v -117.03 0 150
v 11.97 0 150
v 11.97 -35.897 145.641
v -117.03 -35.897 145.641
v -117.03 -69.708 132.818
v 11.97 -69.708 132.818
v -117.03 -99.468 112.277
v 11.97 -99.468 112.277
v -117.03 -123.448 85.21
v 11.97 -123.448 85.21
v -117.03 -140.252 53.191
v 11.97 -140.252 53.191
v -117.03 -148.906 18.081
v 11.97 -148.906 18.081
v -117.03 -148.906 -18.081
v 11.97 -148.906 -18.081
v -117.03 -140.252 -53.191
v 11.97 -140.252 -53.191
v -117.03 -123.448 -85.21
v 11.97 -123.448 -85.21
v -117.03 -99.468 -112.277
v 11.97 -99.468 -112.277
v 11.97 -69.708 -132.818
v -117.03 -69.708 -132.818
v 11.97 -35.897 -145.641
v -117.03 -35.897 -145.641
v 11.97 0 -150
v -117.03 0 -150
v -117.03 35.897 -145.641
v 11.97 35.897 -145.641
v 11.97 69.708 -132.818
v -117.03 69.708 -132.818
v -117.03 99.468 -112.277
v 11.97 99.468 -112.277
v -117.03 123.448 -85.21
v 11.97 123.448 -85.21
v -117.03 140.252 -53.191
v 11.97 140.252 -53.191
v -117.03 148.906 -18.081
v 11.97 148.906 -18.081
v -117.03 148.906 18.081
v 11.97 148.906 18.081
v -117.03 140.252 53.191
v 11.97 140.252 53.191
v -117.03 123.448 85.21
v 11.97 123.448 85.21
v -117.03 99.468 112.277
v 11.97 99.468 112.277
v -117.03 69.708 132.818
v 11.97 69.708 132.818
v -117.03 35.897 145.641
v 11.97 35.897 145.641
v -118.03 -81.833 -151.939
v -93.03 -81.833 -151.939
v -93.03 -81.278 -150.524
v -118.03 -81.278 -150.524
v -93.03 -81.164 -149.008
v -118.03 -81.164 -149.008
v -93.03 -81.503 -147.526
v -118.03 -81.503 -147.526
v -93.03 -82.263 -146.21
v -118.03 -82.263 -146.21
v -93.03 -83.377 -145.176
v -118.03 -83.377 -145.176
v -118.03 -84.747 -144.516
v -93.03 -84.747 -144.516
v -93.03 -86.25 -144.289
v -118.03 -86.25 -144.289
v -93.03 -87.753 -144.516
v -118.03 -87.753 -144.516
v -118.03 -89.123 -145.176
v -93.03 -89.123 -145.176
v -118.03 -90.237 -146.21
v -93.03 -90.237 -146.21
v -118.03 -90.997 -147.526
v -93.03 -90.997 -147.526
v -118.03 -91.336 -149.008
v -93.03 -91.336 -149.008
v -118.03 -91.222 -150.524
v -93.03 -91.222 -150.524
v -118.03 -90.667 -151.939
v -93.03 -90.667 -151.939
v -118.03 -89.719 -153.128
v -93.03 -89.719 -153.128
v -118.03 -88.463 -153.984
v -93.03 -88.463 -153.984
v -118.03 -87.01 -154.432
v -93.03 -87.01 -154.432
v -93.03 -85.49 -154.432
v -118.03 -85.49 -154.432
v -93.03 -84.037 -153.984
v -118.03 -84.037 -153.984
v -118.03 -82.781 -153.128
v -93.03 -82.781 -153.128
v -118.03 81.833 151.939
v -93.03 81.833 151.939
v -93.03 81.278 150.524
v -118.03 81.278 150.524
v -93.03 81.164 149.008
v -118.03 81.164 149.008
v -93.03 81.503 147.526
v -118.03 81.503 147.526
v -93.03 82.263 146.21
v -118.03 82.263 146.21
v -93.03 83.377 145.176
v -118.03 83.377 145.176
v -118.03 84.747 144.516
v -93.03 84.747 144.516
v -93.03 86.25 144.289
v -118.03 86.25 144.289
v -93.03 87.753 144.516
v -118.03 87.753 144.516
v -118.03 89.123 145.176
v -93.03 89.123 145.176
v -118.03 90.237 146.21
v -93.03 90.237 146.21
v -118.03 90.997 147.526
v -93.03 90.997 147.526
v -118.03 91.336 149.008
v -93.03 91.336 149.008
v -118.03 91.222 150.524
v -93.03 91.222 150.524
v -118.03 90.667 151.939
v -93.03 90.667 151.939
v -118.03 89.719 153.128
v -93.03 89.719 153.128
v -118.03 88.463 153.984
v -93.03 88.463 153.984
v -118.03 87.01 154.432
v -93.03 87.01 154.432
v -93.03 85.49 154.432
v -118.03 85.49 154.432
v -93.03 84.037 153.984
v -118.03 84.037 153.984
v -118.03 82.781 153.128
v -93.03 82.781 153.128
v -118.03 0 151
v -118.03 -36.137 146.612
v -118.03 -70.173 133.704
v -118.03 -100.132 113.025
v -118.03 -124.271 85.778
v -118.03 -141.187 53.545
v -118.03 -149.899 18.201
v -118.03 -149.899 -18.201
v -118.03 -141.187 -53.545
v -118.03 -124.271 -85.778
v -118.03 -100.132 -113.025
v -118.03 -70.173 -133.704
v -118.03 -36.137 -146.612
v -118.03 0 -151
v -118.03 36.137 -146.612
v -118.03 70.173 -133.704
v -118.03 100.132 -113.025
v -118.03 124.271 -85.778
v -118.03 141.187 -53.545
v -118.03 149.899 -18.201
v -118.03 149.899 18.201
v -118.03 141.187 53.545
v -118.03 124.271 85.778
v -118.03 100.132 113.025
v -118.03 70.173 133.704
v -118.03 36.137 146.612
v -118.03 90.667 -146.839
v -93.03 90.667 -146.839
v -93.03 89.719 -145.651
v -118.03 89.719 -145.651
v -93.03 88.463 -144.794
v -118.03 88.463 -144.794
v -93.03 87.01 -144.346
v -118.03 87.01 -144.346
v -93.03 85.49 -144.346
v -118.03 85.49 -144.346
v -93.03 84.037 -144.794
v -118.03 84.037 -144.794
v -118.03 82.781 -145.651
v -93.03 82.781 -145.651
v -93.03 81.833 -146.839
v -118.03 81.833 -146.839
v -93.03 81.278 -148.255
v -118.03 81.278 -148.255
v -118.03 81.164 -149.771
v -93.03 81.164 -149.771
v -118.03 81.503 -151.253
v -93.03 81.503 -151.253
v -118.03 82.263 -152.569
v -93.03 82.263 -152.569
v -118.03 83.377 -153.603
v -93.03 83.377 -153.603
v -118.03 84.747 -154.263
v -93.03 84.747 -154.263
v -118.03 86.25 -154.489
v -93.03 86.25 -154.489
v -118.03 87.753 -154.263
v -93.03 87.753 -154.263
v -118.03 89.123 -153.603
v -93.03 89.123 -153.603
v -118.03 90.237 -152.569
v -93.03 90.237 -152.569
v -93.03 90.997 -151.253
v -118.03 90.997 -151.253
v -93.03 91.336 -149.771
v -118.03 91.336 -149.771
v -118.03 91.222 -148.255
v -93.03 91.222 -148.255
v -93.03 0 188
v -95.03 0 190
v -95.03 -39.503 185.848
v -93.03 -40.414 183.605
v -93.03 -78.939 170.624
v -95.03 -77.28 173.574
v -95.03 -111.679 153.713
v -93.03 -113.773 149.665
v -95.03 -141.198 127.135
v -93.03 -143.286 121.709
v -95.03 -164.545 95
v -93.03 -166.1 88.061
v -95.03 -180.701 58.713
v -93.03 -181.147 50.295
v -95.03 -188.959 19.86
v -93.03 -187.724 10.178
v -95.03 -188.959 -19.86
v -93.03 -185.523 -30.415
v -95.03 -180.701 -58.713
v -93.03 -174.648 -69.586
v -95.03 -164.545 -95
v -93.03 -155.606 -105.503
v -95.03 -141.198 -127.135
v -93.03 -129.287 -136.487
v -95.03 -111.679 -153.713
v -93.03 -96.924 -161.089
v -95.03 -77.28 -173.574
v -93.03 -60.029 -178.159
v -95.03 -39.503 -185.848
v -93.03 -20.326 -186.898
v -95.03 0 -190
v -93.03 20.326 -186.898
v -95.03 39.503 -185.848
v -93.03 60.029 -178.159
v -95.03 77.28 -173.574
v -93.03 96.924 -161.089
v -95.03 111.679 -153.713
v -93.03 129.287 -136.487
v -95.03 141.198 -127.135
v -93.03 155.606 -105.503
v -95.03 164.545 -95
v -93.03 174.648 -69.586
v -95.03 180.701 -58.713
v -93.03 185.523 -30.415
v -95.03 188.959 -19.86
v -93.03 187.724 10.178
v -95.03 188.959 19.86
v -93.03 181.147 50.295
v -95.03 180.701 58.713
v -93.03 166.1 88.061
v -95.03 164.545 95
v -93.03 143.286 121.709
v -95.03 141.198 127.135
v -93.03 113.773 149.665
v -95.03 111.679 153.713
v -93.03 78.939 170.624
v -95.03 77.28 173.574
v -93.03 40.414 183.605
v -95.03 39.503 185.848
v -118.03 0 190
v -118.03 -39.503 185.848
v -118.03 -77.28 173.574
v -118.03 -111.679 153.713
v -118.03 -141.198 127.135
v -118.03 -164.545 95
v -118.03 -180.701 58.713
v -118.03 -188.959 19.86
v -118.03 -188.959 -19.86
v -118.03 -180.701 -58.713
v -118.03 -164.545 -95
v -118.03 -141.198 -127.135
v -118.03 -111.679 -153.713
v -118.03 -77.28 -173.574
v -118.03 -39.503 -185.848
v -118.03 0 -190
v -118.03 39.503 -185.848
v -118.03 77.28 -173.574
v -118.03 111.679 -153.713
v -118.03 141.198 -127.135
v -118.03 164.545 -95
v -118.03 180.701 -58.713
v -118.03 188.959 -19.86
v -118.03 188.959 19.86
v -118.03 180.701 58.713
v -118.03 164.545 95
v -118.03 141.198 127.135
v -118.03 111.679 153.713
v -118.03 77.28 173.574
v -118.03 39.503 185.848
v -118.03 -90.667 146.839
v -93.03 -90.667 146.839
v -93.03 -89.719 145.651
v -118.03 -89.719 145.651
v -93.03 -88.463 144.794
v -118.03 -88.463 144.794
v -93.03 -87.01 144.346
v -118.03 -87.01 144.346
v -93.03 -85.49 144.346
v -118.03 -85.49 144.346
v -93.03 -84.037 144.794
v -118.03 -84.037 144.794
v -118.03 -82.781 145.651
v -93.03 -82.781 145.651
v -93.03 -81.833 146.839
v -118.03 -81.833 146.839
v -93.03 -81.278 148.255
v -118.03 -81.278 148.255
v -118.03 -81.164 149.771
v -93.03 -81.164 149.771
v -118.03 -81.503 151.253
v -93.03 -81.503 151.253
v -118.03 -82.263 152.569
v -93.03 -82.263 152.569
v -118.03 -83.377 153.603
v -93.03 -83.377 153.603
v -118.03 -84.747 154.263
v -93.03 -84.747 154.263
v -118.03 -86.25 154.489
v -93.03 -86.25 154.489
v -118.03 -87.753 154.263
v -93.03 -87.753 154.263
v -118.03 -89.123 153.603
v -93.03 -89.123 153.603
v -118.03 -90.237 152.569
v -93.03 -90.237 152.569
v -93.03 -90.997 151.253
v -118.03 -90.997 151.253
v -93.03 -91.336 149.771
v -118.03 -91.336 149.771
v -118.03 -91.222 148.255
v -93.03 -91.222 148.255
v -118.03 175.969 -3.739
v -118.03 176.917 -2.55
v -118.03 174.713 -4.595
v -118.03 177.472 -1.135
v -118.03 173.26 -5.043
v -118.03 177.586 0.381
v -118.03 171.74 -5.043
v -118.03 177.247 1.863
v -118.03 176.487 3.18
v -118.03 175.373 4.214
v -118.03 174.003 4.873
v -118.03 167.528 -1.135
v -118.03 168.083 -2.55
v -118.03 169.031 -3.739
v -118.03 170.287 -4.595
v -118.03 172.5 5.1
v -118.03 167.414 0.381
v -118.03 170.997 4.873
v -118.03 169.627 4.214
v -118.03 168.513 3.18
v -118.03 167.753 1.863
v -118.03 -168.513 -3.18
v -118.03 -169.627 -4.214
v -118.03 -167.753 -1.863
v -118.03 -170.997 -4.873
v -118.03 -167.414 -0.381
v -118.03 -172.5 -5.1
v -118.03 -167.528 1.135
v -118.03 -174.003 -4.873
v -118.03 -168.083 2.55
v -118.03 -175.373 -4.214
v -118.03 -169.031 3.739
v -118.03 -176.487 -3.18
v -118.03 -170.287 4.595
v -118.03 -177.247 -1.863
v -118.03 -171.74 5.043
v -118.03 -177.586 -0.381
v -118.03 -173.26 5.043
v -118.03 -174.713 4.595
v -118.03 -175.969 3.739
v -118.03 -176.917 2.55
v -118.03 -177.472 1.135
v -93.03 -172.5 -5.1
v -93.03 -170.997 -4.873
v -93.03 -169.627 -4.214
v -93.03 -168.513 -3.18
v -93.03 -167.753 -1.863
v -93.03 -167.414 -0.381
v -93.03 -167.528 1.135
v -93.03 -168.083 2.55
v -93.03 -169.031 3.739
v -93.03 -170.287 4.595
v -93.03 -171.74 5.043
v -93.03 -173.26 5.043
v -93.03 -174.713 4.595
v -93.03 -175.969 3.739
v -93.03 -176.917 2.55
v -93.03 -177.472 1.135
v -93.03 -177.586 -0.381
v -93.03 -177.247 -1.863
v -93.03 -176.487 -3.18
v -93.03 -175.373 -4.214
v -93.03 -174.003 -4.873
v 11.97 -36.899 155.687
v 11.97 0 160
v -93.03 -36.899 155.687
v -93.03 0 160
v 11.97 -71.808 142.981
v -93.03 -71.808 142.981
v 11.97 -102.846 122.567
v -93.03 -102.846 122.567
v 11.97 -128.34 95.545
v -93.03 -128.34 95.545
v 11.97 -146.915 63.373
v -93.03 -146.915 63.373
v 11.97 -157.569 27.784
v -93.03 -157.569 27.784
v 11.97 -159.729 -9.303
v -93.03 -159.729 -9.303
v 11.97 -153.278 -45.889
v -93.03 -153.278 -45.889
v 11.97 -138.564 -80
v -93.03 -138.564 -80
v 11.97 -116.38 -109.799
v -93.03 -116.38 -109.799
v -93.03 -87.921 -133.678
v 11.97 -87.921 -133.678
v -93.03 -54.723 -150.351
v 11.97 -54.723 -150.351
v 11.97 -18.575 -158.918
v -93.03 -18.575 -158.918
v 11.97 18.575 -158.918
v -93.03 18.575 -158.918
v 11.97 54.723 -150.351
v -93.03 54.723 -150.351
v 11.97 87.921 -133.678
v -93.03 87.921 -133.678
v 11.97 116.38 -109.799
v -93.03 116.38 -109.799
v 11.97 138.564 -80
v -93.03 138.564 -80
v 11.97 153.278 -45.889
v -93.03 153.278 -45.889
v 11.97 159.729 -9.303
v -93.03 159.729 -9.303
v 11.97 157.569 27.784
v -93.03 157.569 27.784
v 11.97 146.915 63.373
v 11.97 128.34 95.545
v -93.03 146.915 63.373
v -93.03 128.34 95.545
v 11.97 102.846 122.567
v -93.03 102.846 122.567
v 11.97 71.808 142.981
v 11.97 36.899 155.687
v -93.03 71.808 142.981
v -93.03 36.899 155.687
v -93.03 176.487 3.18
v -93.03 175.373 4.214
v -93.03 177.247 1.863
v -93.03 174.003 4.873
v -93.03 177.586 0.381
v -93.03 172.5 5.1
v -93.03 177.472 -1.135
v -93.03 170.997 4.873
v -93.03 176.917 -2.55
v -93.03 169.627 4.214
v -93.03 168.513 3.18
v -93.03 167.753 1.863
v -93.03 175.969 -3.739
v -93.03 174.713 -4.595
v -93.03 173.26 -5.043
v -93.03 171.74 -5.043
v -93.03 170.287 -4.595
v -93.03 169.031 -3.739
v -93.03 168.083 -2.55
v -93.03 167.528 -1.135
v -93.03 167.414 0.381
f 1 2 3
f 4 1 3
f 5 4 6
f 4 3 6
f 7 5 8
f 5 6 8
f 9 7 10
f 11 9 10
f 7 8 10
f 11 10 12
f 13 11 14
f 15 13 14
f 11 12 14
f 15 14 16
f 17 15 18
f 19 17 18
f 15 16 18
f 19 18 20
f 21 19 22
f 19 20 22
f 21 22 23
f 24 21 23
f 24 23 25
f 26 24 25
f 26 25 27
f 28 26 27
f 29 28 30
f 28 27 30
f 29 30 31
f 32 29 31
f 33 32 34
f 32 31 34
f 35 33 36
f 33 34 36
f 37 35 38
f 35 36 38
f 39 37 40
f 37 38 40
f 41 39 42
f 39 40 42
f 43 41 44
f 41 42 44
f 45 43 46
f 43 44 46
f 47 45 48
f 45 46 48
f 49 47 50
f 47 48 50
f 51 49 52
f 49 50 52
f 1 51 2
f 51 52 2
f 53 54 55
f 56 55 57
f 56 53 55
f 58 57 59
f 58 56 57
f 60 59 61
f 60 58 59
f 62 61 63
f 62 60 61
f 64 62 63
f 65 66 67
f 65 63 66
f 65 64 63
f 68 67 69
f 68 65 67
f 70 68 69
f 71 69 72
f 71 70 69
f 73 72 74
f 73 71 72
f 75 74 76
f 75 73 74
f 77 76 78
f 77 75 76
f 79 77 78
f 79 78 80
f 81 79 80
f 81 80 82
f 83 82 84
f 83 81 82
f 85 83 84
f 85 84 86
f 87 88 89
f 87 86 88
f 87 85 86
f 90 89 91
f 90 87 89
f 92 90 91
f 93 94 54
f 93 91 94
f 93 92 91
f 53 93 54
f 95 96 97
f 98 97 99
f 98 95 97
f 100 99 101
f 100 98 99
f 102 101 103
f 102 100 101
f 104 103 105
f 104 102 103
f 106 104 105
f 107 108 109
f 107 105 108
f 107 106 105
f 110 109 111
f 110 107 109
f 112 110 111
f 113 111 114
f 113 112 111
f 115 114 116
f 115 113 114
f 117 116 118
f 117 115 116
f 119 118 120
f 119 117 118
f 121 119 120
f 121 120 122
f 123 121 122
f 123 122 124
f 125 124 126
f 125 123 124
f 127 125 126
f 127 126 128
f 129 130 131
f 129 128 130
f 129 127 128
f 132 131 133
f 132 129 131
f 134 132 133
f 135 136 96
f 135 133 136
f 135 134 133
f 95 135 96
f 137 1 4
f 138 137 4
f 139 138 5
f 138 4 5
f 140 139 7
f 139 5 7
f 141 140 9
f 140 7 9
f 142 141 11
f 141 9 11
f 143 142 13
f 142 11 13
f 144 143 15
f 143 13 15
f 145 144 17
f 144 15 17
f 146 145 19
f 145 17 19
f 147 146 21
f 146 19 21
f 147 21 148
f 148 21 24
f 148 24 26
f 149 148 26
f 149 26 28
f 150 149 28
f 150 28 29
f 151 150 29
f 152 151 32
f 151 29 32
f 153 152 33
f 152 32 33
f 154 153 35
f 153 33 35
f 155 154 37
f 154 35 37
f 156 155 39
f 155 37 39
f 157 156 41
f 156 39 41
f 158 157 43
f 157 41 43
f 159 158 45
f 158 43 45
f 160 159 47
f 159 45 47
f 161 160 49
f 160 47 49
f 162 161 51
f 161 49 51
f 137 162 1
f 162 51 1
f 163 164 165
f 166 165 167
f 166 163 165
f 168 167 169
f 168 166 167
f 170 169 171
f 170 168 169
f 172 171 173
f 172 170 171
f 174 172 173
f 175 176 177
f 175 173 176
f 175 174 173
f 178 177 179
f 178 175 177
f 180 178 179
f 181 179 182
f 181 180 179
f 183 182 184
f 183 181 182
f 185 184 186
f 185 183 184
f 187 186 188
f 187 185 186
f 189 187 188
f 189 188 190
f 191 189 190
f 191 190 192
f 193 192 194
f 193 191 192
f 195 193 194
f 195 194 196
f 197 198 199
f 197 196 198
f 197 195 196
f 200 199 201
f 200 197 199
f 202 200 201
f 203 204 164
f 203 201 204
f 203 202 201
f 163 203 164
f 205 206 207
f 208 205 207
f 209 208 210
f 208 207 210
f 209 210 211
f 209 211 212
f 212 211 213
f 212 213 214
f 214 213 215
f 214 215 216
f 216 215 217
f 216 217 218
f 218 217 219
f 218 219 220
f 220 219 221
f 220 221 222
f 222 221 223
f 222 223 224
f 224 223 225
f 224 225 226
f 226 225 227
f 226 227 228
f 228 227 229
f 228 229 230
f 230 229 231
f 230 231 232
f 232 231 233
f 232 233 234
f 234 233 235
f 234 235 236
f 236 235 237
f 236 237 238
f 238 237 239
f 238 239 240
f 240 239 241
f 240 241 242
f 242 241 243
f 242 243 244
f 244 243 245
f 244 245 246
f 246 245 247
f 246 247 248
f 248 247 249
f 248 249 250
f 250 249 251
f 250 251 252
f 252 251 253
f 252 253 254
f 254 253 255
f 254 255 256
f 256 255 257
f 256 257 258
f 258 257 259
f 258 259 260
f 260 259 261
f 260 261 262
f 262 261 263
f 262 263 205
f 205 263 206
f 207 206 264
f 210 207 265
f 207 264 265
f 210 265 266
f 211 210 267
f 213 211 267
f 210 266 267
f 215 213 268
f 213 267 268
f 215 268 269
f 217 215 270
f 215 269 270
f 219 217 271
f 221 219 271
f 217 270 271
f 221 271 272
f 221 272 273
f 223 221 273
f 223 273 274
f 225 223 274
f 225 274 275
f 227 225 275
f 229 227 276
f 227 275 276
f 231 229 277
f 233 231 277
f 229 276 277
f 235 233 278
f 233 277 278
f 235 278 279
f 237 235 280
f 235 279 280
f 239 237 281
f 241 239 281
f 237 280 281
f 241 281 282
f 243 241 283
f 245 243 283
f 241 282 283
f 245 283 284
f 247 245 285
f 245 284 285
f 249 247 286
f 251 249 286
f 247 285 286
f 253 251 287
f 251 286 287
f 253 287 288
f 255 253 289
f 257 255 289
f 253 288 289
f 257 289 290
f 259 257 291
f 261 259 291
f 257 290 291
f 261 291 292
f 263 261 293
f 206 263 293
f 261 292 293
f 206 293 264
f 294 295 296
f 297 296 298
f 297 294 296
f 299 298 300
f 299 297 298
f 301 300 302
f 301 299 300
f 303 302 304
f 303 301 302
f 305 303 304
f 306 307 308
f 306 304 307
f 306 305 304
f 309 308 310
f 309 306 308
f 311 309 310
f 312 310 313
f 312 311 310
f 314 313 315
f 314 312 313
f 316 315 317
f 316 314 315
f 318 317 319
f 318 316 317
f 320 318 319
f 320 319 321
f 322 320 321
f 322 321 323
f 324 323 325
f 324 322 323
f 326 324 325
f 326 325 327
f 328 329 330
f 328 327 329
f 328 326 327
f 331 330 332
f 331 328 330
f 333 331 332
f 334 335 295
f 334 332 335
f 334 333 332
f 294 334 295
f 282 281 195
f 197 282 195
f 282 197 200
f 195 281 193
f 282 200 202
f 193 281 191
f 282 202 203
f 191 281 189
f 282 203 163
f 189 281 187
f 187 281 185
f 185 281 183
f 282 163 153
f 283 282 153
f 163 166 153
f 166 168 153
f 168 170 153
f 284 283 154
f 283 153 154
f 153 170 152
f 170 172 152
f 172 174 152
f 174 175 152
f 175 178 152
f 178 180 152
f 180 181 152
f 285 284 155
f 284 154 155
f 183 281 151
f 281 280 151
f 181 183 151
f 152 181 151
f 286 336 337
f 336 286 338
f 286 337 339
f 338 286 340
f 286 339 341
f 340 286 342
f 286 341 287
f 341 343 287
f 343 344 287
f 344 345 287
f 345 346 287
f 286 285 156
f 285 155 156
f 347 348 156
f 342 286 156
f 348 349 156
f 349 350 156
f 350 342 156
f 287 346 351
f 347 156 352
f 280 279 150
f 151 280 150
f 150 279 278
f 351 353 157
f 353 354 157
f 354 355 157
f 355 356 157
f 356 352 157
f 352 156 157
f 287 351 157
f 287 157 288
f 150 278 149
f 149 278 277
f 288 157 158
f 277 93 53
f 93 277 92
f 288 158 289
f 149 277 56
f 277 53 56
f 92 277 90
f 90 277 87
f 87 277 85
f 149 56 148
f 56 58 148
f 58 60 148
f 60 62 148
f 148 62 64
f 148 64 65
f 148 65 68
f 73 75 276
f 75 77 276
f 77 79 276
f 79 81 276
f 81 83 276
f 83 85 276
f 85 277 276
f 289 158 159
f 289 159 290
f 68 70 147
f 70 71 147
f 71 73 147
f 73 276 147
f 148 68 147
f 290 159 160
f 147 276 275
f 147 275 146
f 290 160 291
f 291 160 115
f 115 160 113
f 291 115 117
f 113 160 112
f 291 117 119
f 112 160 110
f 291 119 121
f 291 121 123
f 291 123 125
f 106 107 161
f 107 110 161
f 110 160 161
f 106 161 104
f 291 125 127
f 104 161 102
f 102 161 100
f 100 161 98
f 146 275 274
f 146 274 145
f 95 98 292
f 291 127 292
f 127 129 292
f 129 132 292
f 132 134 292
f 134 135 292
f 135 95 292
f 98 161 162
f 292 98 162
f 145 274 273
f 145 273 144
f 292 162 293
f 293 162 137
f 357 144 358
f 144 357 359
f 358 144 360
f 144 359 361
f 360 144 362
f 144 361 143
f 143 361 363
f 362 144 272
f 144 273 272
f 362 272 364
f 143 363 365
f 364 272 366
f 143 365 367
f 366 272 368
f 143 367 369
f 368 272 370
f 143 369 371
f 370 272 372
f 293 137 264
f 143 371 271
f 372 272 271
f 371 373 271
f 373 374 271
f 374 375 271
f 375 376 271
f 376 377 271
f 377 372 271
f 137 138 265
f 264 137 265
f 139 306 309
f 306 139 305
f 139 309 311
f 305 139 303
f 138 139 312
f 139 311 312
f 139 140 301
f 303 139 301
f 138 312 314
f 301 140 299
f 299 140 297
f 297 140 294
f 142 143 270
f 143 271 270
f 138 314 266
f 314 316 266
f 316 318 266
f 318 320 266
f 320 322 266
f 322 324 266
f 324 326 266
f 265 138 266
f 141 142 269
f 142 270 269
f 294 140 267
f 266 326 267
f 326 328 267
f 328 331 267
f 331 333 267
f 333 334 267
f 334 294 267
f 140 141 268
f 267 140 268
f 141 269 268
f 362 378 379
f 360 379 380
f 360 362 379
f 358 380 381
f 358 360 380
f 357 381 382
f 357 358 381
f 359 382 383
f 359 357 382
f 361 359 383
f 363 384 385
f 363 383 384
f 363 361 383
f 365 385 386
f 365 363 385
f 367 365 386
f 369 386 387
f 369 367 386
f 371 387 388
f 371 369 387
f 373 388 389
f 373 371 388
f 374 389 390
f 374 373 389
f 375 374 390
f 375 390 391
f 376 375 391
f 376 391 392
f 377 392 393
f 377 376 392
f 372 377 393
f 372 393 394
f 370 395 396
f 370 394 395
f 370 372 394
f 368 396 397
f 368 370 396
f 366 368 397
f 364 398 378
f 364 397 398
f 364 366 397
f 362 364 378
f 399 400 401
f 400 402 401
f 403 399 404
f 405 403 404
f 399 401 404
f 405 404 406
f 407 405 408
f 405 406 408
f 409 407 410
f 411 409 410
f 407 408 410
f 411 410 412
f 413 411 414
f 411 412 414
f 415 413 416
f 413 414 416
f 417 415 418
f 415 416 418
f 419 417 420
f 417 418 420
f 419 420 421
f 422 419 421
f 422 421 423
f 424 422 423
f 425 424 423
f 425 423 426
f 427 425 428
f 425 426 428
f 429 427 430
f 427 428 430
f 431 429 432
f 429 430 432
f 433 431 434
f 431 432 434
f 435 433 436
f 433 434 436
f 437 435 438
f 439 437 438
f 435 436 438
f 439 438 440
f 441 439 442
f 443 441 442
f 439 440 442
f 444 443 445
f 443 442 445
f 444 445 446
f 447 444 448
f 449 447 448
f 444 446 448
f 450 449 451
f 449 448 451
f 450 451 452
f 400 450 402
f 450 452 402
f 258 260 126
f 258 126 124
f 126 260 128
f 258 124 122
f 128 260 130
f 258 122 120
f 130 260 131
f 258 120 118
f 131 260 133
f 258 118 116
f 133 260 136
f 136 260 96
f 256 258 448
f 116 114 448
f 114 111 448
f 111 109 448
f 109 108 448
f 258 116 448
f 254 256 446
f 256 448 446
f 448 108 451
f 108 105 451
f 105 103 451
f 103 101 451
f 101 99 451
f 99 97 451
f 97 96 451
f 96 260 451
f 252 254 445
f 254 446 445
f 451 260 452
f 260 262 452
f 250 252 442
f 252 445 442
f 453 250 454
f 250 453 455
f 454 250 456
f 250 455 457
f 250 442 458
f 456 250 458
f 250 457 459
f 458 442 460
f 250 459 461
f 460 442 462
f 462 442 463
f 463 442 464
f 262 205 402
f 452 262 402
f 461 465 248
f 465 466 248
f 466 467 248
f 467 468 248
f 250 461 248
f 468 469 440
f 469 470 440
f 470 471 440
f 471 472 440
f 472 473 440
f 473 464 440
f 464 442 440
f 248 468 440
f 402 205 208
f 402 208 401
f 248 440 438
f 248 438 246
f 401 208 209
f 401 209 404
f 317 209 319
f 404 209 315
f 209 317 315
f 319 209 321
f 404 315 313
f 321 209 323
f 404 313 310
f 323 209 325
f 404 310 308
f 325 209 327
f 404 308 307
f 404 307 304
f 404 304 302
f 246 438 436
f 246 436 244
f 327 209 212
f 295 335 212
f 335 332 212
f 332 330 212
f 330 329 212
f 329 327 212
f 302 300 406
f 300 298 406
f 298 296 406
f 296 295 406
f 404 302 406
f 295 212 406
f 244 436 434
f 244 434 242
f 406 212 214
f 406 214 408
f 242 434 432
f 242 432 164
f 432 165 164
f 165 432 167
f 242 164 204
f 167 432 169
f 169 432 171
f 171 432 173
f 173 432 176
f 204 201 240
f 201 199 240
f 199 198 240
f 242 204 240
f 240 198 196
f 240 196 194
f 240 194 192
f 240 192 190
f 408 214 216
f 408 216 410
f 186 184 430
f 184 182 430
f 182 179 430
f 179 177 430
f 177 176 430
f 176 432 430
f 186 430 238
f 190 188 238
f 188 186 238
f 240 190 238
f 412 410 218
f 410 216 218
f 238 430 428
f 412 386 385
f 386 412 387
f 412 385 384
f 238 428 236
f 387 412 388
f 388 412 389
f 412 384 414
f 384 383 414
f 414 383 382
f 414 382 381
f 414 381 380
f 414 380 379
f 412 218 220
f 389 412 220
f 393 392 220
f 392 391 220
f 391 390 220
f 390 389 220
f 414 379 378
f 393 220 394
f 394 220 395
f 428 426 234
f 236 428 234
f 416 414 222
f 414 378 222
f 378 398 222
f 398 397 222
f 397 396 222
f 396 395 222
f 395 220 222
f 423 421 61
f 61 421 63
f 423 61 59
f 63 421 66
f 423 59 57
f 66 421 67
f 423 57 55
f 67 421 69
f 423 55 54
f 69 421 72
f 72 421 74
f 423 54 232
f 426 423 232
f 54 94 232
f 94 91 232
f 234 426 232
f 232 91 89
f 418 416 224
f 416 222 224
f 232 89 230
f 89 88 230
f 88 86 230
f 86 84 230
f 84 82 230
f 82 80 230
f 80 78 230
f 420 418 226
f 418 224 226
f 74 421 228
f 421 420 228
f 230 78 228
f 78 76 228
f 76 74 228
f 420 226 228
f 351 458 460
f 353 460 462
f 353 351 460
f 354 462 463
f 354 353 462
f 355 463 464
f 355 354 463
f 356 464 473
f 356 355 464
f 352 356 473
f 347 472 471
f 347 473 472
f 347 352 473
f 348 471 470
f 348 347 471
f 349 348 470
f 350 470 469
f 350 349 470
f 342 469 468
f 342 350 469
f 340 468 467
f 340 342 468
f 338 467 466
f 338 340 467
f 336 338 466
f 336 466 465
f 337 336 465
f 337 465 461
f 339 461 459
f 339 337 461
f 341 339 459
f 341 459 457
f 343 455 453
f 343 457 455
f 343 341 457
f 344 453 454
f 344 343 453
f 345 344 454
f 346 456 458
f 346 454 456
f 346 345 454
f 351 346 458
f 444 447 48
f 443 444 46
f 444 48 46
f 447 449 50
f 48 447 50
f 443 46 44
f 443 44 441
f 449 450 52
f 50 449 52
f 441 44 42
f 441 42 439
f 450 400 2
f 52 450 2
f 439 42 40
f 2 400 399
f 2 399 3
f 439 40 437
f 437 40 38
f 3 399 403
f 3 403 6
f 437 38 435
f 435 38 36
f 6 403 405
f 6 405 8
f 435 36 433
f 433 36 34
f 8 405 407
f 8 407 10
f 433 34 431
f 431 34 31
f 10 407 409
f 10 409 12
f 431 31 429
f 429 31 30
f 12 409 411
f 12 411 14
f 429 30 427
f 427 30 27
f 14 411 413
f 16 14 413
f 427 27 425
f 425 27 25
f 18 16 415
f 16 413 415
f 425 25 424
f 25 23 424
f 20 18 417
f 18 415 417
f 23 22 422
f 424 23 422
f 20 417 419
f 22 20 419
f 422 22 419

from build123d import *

# Parameters (mm, degrees)
CHAMFER_1_SIZE           = 2
CHAMFER_2_SIZE           = 1
PATTERN_CIRCULAR_1_COUNT = 6


with BuildPart() as part:
    # Эскиз1 → Повернуть1 (revolve)
    with BuildSketch(Plane.XY, mode=Mode.PRIVATE) as revolve_1_sk:
        Polygon((-118.03030303, 150), (11.96969697, 150), (11.96969697, 160), (-93.03030303, 160), (-93.03030303, 190), (-118.03030303, 190), align=None)
    revolve(revolve_1_sk.sketch.rotate(Axis((-311.484848485, 0, 0), (1, 0, 0)), 90), axis=Axis((-311.484848485, 0, 0), (1, 0, 0)))

    # Фаска1
    chamfer_1_edges = [part.edges().sort_by_distance(p)[0] for p in [
        (-93.03030303, 0, -190),
    ]]
    chamfer(chamfer_1_edges, length=CHAMFER_1_SIZE)

    # Фаска2
    chamfer_2_edges = [part.edges().sort_by_distance(p)[0] for p in [
        (-118.03030303, 0, -150),
    ]]
    chamfer(chamfer_2_edges, length=CHAMFER_2_SIZE)

    # Эскиз6 → Отверстие обработанное метчиком M121 (revolve, cut)
    with BuildSketch(Plane(origin=(-118.03030303, 172.5, 0), x_dir=(0, 0, 1), z_dir=(0, 1, 0))):
        Polygon((0, 0), (0, 35.814389157), (5.1, 32.75), (5.1, 0), align=None)
    hole_wizard_m121 = revolve(axis=Axis((-124.38030303, 172.5, 0), (1, 0, 0)), mode=Mode.SUBTRACT)

    # Круговой массив1: Отверстие обработанное метчиком M121 ×6 about axis
    pattern_circular_1_axis = Axis((0, 0, 0), (1, 0, 0))
    for i in range(1, PATTERN_CIRCULAR_1_COUNT):
        add(hole_wizard_m121.rotate(pattern_circular_1_axis, i * 360 / PATTERN_CIRCULAR_1_COUNT), mode=Mode.SUBTRACT)


solid = part.part
